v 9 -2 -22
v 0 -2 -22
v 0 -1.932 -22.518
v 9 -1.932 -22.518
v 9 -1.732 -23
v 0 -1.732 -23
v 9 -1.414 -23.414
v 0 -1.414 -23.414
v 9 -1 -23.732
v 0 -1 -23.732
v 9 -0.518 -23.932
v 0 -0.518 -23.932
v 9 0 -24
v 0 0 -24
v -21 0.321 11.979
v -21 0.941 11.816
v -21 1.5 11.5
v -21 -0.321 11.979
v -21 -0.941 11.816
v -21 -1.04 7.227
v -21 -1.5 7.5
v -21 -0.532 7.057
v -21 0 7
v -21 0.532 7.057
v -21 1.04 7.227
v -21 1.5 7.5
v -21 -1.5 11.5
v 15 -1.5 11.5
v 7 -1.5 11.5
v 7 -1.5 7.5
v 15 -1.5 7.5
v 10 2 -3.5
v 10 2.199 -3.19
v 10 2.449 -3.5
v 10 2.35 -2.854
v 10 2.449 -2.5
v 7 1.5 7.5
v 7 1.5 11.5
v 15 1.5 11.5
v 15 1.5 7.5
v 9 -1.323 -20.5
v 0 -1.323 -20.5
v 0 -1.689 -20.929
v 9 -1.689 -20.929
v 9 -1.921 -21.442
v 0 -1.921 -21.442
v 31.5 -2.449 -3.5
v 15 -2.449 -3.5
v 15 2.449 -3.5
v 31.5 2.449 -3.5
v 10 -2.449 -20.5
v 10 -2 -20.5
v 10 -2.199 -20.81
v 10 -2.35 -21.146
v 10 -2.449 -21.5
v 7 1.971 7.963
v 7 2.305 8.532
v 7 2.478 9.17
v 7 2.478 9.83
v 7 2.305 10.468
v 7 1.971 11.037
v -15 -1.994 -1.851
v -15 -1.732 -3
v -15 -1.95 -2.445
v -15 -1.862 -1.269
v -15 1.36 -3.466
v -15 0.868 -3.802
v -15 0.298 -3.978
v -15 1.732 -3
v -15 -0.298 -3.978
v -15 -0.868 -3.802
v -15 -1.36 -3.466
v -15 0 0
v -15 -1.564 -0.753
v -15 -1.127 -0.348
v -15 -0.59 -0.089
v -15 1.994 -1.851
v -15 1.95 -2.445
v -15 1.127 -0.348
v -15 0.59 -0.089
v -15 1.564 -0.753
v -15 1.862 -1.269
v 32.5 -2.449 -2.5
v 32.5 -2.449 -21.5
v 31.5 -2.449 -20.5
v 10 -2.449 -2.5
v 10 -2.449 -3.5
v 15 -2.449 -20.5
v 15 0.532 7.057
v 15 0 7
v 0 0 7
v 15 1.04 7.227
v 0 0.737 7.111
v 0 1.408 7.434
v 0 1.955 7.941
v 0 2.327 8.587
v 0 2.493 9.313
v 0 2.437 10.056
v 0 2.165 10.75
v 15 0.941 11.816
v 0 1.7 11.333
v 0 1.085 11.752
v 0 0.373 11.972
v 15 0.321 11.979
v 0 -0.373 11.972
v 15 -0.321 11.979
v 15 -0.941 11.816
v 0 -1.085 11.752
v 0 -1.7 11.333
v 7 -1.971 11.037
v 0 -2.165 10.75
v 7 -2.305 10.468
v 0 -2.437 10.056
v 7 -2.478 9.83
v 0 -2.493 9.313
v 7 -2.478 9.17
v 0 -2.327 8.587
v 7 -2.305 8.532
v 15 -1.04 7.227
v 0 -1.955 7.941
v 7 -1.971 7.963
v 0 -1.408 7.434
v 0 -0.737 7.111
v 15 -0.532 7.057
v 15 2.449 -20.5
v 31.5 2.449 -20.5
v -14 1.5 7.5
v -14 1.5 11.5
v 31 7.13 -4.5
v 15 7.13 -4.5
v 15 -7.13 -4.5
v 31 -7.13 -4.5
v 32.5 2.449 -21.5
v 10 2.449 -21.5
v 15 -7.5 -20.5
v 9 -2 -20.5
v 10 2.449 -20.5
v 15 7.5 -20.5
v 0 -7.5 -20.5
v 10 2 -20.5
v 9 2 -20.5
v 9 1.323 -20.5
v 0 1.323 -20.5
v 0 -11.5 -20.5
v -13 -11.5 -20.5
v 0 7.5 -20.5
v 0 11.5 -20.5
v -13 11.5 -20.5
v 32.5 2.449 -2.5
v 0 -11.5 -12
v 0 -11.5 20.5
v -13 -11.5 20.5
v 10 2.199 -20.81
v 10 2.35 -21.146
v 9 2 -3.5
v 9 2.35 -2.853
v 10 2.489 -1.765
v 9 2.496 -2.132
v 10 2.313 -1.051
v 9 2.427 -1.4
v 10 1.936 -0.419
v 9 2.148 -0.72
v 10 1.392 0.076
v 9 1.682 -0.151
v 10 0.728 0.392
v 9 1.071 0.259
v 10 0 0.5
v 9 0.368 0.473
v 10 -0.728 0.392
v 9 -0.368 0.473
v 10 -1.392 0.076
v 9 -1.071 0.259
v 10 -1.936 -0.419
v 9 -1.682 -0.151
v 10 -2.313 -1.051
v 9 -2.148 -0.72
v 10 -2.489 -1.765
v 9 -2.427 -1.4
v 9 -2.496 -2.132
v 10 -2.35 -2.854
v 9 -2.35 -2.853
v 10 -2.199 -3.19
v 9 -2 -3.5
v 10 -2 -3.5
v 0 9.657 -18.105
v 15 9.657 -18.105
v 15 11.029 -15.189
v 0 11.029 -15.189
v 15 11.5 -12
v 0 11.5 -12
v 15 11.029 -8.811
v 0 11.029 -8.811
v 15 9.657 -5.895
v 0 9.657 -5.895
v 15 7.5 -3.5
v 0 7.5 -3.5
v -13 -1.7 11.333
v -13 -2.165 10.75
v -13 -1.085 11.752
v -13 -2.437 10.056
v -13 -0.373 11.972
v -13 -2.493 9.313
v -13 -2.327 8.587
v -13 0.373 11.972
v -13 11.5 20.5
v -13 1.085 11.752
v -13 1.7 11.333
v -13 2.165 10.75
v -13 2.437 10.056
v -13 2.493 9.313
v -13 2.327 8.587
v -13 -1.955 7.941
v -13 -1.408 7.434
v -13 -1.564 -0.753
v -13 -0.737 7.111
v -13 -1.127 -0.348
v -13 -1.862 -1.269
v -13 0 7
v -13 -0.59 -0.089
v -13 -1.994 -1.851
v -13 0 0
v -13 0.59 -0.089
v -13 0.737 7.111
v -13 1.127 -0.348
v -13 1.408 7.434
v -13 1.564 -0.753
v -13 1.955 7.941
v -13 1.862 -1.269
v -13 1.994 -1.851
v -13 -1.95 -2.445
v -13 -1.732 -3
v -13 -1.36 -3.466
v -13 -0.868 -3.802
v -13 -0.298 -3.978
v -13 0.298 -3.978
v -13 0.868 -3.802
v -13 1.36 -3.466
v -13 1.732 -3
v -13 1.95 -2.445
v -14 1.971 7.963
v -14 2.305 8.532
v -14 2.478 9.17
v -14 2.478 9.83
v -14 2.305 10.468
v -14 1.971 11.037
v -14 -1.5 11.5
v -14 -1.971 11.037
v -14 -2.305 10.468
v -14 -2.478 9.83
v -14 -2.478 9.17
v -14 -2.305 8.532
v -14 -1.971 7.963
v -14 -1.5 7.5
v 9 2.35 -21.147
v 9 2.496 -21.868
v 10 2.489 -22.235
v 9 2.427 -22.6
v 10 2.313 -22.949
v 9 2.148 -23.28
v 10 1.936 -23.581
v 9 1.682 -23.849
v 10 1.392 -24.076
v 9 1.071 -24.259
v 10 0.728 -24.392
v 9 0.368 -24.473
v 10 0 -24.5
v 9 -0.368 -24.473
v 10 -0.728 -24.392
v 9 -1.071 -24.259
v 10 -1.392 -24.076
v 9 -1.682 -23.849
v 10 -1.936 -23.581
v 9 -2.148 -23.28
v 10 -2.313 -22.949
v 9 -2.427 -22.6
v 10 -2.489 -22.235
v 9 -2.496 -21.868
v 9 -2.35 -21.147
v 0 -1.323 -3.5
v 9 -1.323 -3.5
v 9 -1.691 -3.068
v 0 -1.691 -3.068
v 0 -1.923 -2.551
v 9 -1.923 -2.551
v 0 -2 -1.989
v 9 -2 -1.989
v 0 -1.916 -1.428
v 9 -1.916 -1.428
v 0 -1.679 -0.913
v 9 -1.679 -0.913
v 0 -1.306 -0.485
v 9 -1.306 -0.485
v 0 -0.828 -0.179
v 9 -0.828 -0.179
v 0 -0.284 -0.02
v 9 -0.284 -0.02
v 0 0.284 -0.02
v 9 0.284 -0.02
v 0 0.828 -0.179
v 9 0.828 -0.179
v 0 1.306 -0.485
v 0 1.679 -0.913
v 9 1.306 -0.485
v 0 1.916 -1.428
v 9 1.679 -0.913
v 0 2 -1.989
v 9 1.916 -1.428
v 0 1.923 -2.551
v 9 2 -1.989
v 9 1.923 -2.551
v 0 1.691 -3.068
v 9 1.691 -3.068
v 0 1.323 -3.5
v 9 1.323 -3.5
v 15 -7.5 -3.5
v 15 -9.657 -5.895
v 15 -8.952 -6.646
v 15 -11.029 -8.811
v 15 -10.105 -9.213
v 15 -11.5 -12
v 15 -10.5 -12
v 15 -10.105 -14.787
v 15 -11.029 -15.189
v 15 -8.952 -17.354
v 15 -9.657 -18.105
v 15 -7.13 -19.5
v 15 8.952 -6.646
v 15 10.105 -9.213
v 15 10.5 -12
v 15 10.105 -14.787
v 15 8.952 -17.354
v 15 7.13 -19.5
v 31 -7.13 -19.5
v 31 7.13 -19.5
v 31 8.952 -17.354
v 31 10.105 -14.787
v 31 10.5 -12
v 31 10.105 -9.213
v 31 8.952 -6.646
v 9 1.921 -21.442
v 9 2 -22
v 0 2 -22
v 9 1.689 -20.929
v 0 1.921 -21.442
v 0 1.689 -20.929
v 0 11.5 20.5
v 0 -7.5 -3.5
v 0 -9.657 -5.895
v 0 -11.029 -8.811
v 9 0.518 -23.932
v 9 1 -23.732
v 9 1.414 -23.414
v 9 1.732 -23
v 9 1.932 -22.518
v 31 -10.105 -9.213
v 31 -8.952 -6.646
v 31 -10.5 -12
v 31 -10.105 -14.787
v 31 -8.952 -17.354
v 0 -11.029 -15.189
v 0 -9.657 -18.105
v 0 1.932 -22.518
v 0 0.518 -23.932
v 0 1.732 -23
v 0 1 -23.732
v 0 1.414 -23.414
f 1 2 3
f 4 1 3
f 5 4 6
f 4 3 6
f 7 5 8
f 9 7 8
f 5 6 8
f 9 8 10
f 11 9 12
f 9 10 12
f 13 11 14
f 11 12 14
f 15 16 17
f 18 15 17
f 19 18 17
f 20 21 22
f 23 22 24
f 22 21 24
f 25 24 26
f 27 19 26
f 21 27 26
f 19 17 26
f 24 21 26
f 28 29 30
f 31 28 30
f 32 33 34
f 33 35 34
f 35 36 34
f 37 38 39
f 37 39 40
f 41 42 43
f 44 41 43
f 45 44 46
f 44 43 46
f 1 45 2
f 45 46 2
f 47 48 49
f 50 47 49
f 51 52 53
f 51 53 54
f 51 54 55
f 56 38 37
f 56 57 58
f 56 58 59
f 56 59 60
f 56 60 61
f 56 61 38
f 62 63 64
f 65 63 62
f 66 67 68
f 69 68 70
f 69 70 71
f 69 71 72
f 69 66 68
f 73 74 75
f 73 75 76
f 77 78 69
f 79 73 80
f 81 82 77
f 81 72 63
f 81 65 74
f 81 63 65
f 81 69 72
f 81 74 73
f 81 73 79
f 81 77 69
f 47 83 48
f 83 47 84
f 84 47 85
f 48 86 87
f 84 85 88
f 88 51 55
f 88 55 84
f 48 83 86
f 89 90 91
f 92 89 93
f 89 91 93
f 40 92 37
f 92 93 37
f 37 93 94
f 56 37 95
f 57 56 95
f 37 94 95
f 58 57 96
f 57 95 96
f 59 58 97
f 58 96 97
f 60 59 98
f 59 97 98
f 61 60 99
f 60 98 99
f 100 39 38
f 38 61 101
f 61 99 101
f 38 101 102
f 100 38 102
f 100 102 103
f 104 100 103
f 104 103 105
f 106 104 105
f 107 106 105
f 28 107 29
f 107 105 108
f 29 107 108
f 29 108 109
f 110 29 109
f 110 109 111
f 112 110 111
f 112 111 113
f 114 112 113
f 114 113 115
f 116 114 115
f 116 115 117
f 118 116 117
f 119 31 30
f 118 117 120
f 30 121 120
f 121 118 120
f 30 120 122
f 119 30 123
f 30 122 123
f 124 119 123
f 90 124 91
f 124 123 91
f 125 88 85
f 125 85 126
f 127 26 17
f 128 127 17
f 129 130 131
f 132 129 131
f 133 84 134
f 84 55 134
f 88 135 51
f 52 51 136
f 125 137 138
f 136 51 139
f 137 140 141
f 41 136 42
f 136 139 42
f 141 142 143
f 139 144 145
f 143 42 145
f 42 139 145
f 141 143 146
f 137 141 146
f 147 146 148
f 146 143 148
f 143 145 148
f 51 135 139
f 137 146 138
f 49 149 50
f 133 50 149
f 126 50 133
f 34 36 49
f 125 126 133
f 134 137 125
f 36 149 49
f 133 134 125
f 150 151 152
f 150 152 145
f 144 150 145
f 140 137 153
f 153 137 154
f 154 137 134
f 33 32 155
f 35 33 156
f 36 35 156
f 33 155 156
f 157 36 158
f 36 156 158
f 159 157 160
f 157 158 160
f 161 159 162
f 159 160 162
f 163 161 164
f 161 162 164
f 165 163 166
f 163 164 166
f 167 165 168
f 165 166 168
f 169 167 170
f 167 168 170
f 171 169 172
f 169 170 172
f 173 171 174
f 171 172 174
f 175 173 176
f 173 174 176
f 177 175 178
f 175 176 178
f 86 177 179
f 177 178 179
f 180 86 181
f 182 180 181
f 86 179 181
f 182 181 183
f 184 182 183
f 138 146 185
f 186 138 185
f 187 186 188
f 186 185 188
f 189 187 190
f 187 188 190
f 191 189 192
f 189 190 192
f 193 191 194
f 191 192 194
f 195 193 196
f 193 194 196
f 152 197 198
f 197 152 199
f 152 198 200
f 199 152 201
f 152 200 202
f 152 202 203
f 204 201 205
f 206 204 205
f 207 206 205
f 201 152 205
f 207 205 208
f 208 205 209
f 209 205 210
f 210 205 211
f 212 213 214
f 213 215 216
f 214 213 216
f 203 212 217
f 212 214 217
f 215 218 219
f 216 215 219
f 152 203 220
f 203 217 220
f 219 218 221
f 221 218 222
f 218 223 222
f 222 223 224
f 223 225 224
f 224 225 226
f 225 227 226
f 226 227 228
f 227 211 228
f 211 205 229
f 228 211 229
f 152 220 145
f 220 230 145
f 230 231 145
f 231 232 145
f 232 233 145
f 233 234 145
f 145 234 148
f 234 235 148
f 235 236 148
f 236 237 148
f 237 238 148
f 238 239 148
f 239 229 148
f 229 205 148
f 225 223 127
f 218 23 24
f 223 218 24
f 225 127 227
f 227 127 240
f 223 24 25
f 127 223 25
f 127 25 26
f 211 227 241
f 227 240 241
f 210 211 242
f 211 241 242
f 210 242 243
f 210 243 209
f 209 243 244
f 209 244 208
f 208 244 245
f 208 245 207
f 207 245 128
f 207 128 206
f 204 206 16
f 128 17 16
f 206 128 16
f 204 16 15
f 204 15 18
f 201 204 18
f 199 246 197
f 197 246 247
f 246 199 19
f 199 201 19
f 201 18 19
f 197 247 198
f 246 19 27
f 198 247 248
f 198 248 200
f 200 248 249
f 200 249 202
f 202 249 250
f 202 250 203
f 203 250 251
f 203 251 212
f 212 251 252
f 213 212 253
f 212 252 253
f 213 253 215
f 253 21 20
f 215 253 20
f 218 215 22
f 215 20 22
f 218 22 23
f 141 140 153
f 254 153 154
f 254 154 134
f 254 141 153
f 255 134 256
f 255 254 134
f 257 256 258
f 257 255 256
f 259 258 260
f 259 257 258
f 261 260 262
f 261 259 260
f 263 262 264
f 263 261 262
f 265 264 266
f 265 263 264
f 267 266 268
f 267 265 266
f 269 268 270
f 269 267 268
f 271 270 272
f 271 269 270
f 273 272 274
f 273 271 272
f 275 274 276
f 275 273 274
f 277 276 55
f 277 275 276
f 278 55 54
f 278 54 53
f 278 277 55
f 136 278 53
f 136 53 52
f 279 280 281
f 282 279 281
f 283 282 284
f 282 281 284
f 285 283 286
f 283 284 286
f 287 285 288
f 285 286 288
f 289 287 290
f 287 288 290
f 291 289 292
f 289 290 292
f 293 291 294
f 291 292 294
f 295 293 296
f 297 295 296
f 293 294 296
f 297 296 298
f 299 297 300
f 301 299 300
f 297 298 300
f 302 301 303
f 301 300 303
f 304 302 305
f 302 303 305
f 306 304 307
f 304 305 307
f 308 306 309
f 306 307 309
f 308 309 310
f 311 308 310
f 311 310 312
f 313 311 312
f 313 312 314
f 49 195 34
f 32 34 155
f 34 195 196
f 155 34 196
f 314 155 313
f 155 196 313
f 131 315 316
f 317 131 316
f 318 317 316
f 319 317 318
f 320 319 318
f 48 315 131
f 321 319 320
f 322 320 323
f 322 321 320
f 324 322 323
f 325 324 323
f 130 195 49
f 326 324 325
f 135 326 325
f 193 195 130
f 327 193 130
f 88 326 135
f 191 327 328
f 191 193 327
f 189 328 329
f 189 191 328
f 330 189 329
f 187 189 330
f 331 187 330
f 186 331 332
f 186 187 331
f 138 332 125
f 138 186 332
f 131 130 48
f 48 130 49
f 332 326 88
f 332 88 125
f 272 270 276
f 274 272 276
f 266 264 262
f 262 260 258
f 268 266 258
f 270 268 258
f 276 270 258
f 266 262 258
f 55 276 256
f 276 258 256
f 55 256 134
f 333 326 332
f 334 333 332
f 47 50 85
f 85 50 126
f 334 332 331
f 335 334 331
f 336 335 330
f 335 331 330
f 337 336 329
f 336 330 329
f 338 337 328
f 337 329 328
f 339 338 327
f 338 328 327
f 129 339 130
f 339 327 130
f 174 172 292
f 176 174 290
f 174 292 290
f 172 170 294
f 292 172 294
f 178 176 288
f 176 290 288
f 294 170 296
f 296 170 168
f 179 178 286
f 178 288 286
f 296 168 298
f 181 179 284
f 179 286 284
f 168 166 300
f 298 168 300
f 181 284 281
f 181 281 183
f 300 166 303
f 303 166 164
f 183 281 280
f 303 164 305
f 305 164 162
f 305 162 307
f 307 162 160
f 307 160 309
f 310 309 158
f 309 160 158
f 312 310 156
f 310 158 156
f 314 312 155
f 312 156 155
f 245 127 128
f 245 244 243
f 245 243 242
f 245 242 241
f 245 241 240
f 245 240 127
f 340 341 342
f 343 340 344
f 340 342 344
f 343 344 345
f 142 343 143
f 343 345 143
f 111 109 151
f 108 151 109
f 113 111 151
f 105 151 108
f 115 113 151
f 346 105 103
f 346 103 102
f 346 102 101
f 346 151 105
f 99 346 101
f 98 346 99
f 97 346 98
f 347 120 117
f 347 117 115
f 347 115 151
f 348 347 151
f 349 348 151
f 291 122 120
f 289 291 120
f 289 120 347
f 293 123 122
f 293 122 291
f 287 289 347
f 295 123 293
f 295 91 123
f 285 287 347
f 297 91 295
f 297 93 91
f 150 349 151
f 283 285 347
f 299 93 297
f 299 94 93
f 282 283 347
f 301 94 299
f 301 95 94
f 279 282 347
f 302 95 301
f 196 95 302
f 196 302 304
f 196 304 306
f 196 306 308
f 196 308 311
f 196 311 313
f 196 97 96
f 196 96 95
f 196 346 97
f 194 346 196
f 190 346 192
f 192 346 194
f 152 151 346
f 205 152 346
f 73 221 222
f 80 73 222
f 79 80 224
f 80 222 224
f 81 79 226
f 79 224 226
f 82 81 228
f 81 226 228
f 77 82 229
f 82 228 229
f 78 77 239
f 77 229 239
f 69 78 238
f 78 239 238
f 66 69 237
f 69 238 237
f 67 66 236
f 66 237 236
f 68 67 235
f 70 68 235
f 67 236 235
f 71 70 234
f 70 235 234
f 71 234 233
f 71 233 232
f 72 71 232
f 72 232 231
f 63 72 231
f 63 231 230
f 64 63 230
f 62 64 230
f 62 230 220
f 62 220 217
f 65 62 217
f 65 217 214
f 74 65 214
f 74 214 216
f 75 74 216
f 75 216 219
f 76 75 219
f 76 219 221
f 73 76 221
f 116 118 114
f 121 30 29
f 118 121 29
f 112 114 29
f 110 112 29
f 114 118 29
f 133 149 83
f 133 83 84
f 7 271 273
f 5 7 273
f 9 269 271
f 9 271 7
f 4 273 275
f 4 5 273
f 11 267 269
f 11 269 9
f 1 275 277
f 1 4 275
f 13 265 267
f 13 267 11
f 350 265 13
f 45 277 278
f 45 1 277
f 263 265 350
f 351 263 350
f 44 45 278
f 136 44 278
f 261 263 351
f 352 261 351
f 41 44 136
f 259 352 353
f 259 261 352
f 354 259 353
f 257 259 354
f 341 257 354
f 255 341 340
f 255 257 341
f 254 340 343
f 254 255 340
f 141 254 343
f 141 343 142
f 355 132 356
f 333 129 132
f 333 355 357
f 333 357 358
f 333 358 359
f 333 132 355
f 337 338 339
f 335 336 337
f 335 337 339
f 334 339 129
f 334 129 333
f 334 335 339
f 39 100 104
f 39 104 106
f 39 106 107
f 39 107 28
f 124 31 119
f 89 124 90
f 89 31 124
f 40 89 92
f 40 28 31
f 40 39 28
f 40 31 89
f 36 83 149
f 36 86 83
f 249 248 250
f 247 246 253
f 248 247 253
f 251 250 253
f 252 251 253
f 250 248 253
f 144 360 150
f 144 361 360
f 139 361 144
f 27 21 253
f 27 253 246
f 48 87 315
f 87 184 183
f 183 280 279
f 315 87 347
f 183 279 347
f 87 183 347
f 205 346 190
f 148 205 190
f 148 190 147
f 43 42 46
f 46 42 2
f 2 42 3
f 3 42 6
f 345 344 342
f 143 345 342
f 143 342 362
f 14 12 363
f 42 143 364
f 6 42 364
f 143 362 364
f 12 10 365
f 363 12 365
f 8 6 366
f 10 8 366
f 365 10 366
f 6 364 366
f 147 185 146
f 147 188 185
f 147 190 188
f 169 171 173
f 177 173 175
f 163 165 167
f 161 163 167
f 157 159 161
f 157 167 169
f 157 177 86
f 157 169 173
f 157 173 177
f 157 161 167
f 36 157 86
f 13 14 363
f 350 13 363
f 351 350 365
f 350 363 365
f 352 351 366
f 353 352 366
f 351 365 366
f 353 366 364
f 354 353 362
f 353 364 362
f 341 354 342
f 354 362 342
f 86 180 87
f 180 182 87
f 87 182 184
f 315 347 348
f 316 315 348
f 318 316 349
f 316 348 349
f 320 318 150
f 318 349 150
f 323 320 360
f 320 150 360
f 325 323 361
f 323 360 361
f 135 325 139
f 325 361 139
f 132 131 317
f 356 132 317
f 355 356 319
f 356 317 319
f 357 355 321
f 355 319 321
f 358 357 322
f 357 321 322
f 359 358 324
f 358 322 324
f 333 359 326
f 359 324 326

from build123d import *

# Parameters (mm, degrees)
SKETCH_1_W           = 41
SKETCH_1_H           = 23
EXTRUDE_1_DEPTH      = 13
EXTRUDE_2_DEPTH      = 15
EXTRUDE_2_DEPTH_BACK = 21
SKETCH_2_R           = 2.5
EXTRUDE_3_DEPTH      = 2
EXTRUDE_3_DEPTH_BACK = 22
SKETCH_3_R           = 2
SKETCH_3_R_2         = 2.5
CUT_EXTRUDE_1_DEPTH  = 7
CUT_EXTRUDE_2_DEPTH  = 8
EXTRUDE_4_DEPTH      = 15
EXTRUDE_5_DEPTH      = 16
EXTRUDE_10_DEPTH     = 9
EXTRUDE_7_DEPTH      = 1
SKETCH_12_W          = 1
SKETCH_12_H          = 4.898979486
EXTRUDE_11_DEPTH     = 21.5
SKETCH_13_W          = 19
SKETCH_13_H          = 4.898979486
EXTRUDE_12_DEPTH     = 1


with BuildPart() as part:
    # 스케치1 → 보스-돌출1 (new body)
    with BuildSketch(Plane(origin=(0, 0, 0), x_dir=(0, 0, -1), z_dir=(1, 0, 0))):
        Rectangle(SKETCH_1_W, SKETCH_1_H)
    extrude(amount=-EXTRUDE_1_DEPTH)

    # 스케치2 → 보스-돌출2 (add, two sides: drawn at the far end of the back side and taken through both)
    with BuildSketch(Plane(origin=(0, 0, 0), x_dir=(0, 0, -1), z_dir=(1, 0, 0)).offset(-EXTRUDE_2_DEPTH_BACK)):
        with Locations((-9.5, 0)):
            Circle(SKETCH_2_R)
    extrude(amount=EXTRUDE_2_DEPTH + EXTRUDE_2_DEPTH_BACK)

    # 스케치3 → 보스-돌출3 (add, two sides: drawn at the far end of the back side and taken through both)
    with BuildSketch(Plane.ZY.offset(13).offset(-EXTRUDE_3_DEPTH_BACK)):
        with Locations((-2, 0)):
            Circle(SKETCH_3_R)
        with Locations(Location((9.5, 0, 0), (0, 0, 180))):
            Circle(SKETCH_3_R_2)
    extrude(amount=EXTRUDE_3_DEPTH + EXTRUDE_3_DEPTH_BACK)

    # 스케치5 → 컷-돌출1 (cut)
    with BuildSketch(Plane.ZY.offset(21)):
        with BuildLine():
            Line((7.5, 1.5), (11.5, 1.5))
            ThreePointArc((11.5, 1.5), (9.5, 2.5), (7.5, 1.5))
        make_face()
        with BuildLine():
            Line((7.5, -1.5), (11.5, -1.5))
            ThreePointArc((11.5, -1.5), (9.5, -2.5), (7.5, -1.5))
        make_face()
    extrude(amount=-CUT_EXTRUDE_1_DEPTH, mode=Mode.SUBTRACT)

    # 스케치6 → 컷-돌출2 (cut)
    with BuildSketch(Plane(origin=(15, 0, 0), x_dir=(0, 0, -1), z_dir=(1, 0, 0))):
        with BuildLine():
            Line((-11.5, 1.5), (-7.5, 1.5))
            ThreePointArc((-7.5, 1.5), (-9.5, 2.5), (-11.5, 1.5))
        make_face()
        with BuildLine():
            Line((-11.5, -1.5), (-7.5, -1.5))
            ThreePointArc((-7.5, -1.5), (-9.5, -2.5), (-11.5, -1.5))
        make_face()
    extrude(amount=-CUT_EXTRUDE_2_DEPTH, mode=Mode.SUBTRACT)

    # 스케치7 → 보스-돌출4 (add)
    with BuildSketch(Plane(origin=(0, 0, 0), x_dir=(0, 0, -1), z_dir=(1, 0, 0))):
        with BuildLine():
            Line((3.5, 7.5), (3.5, -7.5))
            ThreePointArc((3.5, -7.5), (12, -11.5), (20.5, -7.5))
            Line((20.5, -7.5), (20.5, 7.5))
            ThreePointArc((20.5, 7.5), (12, 11.5), (3.5, 7.5))
        make_face()
    extrude(amount=EXTRUDE_4_DEPTH)

    # 스케치8 → 보스-돌출5 (add)
    with BuildSketch(Plane(origin=(15, 0, 0), x_dir=(0, 0, -1), z_dir=(1, 0, 0))):
        with BuildLine():
            Line((4.5, 7.130279596), (4.5, -7.130279596))
            ThreePointArc((4.5, -7.130279596), (12, -10.5), (19.5, -7.130279596))
            Line((19.5, -7.130279596), (19.5, 7.130279596))
            ThreePointArc((19.5, 7.130279596), (12, 10.5), (4.5, 7.130279596))
        make_face()
    extrude(amount=EXTRUDE_5_DEPTH)

    # 스케치10 → 보스-돌출10 (add)
    with BuildSketch(Plane(origin=(0, 0, 0), x_dir=(0, 0, -1), z_dir=(1, 0, 0))):
        with BuildLine():
            ThreePointArc((20.5, 1.322875656), (20, 0), (20.5, -1.322875656))
            Line((20.5, -1.322875656), (20.5, 1.322875656))
        make_face()
        with BuildLine():
            Line((20.5, 1.322875656), (20.5, -1.322875656))
            ThreePointArc((20.5, -1.322875656), (21.177124344, -1.822875656), (22, -2))
            ThreePointArc((22, -2), (23.414213562, -1.414213562), (24, 0))
            ThreePointArc((24, 0), (23.414213562, 1.414213562), (22, 2))
            ThreePointArc((22, 2), (21.177124344, 1.822875656), (20.5, 1.322875656))
        make_face()
    extrude(amount=EXTRUDE_10_DEPTH)

    # 스케치11 → 보스-돌출7 (add)
    with BuildSketch(Plane(origin=(9, 0, 0), x_dir=(0, 0, -1), z_dir=(1, 0, 0))):
        with BuildLine():
            Line((20, -1.5), (20, 1.5))
            ThreePointArc((20, 1.5), (24.5, 0), (20, -1.5))
        make_face()
        with BuildLine():
            Line((4, -1.5), (4, 1.5))
            ThreePointArc((4, 1.5), (-0.5, 0), (4, -1.5))
        make_face()
    extrude(amount=EXTRUDE_7_DEPTH)

    # 스케치12 → 보스-돌출11 (add)
    with BuildSketch(Plane(origin=(10, 0, 0), x_dir=(0, 0, -1), z_dir=(1, 0, 0))):
        with Locations((21, 0)):
            Rectangle(SKETCH_12_W, SKETCH_12_H)
        with Locations((3, 0)):
            Rectangle(SKETCH_12_W, SKETCH_12_H)
    extrude(amount=EXTRUDE_11_DEPTH)

    # 스케치13 → 보스-돌출12 (add)
    with BuildSketch(Plane(origin=(31.5, 0, 0), x_dir=(0, 0, -1), z_dir=(1, 0, 0))):
        with Locations((12, 0)):
            Rectangle(SKETCH_13_W, SKETCH_13_H)
    extrude(amount=EXTRUDE_12_DEPTH)


solid = part.part
